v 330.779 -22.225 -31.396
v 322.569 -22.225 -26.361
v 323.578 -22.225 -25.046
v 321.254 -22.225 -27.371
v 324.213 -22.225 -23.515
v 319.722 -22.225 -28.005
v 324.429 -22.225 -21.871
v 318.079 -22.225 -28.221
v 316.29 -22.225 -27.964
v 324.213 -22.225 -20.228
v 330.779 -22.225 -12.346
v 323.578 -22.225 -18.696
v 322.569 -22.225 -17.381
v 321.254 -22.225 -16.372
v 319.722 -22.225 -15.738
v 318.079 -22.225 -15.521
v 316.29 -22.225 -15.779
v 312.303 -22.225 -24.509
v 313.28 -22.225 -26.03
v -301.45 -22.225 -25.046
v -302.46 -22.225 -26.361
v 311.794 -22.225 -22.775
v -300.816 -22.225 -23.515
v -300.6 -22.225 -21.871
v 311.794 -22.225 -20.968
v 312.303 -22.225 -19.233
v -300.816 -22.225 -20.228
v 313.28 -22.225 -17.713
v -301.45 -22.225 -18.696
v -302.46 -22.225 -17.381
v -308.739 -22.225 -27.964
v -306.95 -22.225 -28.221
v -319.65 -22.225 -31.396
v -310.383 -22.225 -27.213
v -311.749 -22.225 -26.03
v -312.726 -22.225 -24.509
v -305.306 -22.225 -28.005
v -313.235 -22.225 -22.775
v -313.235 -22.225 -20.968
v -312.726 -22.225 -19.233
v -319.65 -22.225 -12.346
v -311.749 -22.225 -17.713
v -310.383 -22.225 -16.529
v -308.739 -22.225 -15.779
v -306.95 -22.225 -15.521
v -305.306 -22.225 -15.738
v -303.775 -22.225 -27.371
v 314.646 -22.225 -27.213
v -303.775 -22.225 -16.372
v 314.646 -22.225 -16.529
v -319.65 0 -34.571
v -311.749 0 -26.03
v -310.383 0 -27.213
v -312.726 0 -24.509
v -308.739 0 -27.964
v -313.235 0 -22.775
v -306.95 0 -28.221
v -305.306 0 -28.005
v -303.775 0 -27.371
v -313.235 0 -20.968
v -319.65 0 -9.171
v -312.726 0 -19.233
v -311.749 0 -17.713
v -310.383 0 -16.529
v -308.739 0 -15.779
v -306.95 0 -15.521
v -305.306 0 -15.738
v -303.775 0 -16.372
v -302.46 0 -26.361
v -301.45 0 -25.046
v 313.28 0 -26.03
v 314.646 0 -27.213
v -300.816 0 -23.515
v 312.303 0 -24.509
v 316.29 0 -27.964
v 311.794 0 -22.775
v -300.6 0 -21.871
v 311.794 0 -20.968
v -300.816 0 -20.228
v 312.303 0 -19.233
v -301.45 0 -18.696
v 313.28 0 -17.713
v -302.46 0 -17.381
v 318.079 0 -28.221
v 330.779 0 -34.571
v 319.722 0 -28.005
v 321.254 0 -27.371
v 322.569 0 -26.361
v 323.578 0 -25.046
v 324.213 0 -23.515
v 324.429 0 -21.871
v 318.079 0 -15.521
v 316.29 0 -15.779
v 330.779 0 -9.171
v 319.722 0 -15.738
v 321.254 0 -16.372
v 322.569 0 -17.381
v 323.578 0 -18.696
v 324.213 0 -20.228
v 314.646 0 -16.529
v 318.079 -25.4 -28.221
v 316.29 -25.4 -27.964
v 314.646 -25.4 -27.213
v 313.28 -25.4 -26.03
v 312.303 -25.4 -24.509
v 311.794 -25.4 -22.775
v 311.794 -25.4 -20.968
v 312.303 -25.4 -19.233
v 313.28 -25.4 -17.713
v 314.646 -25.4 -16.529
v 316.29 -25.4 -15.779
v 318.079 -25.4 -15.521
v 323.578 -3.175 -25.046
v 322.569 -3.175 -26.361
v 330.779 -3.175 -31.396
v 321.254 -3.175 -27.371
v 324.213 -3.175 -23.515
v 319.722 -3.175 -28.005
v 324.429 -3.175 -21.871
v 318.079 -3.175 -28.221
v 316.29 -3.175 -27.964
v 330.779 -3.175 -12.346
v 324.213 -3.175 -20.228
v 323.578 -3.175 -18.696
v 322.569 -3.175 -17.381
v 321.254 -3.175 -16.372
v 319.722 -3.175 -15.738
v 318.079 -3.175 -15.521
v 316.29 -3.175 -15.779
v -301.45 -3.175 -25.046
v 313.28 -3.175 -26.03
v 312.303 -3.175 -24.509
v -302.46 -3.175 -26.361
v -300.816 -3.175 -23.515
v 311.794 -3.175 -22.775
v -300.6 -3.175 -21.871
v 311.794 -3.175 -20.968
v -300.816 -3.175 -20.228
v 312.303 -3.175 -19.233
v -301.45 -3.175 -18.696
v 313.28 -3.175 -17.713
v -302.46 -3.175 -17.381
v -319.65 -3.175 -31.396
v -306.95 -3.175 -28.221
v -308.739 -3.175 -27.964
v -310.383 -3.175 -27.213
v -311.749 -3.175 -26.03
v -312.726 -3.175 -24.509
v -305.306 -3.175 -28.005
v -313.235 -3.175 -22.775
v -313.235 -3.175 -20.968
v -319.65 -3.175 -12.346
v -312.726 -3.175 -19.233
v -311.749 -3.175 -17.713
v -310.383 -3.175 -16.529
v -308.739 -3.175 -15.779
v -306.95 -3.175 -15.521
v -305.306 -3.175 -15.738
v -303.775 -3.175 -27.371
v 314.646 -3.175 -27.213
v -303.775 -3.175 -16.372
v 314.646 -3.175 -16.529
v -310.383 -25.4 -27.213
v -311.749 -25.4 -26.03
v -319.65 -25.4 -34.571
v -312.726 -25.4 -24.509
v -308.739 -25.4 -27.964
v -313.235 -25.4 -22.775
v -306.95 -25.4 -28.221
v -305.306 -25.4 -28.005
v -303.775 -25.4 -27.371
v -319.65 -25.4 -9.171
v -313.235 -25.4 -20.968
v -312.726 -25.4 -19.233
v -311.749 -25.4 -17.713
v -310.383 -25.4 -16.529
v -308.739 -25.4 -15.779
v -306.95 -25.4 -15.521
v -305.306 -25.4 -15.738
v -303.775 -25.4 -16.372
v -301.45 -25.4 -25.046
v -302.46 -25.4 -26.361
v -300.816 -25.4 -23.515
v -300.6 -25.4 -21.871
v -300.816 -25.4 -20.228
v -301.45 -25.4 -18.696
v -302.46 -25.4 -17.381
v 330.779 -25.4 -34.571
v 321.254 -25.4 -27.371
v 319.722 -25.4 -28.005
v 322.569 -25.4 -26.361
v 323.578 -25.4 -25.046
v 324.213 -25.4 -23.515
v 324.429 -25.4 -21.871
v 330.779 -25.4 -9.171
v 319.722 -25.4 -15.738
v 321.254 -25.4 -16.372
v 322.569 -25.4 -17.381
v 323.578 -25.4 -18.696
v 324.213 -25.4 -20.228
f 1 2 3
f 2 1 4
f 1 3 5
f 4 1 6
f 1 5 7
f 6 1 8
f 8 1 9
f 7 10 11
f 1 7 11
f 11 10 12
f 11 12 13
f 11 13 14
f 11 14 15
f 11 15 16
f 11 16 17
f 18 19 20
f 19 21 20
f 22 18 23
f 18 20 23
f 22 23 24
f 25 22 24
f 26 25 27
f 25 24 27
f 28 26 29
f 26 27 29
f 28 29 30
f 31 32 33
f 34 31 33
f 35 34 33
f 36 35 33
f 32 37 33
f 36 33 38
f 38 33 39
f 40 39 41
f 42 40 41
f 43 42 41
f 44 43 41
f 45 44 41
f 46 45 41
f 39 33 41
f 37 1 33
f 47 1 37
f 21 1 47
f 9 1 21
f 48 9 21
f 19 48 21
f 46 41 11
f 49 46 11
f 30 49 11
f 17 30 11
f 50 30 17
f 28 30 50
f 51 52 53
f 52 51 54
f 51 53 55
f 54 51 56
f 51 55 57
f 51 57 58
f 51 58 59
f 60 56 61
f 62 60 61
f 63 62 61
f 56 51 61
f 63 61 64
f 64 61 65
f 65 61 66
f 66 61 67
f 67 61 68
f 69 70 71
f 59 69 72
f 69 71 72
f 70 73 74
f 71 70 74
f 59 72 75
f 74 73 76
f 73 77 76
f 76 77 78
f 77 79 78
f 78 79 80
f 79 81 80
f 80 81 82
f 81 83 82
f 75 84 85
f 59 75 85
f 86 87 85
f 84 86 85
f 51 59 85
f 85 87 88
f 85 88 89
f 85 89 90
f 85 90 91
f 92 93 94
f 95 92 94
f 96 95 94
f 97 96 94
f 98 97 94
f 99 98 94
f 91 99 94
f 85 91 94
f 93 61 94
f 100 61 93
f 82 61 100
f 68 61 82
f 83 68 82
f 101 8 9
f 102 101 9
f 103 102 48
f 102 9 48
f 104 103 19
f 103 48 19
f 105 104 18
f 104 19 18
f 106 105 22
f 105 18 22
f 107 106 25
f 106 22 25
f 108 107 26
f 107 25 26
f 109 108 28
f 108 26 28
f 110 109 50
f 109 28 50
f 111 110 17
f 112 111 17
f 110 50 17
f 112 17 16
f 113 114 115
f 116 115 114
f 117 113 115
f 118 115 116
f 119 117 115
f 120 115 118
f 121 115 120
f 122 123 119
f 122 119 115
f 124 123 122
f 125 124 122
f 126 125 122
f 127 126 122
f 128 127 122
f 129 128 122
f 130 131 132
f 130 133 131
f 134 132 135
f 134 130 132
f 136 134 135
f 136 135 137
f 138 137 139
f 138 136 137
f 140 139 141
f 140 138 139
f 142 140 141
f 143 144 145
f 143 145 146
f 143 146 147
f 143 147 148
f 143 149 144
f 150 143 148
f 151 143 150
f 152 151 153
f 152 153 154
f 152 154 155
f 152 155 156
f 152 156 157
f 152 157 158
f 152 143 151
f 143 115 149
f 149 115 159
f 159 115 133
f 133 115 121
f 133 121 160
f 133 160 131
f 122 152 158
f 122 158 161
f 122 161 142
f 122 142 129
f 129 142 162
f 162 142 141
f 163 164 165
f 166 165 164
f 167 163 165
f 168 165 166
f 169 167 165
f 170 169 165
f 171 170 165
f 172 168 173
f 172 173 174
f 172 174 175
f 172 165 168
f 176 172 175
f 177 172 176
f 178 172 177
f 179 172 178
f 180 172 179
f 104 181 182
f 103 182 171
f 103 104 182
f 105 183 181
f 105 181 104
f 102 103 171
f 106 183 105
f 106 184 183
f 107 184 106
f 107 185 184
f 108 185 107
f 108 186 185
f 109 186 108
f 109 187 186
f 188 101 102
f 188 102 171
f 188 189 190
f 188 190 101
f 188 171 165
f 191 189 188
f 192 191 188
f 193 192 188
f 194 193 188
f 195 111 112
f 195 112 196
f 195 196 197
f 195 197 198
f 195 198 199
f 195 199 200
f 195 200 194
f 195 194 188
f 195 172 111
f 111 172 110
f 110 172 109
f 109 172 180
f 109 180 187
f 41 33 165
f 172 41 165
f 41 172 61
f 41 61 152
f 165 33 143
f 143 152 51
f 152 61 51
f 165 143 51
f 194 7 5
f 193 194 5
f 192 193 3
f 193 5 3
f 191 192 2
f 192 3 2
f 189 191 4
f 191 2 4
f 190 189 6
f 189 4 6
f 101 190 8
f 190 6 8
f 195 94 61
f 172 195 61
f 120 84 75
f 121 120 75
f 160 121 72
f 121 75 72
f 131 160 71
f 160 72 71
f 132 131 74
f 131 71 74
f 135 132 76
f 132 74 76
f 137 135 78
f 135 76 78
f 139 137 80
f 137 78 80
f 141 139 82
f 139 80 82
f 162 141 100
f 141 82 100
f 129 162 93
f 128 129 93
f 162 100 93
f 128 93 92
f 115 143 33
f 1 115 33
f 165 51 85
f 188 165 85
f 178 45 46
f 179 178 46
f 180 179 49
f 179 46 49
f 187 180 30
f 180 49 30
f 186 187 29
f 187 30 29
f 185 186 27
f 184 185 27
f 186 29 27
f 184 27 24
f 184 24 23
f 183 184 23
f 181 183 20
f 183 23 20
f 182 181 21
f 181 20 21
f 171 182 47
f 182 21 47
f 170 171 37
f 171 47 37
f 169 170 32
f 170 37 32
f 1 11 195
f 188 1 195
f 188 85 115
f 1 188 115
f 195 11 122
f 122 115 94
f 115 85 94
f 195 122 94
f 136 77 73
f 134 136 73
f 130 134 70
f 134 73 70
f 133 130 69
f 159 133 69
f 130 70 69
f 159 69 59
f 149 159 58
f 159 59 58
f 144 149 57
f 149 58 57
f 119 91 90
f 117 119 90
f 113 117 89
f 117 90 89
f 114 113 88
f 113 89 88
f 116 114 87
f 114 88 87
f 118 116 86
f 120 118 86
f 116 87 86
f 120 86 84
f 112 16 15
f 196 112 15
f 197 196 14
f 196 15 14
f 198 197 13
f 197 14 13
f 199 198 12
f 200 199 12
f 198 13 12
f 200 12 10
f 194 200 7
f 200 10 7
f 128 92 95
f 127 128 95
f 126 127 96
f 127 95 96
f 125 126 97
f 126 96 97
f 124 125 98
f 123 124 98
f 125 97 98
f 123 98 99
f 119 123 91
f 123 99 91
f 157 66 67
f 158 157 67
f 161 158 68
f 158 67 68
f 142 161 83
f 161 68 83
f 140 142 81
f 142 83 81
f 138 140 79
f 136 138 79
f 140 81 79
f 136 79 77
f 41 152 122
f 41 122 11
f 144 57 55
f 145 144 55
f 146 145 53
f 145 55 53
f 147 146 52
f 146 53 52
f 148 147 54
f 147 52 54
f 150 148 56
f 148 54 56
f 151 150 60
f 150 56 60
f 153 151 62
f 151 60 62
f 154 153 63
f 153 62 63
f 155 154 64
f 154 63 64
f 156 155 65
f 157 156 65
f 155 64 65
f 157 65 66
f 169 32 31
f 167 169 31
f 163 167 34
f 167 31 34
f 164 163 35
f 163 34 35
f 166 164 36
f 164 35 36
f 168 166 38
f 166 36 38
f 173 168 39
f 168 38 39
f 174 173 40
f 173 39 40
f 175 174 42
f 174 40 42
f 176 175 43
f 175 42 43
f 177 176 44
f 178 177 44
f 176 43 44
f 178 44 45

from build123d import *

# Parameters (mm, degrees)
F1_DEPTH = 25.4
F2_W     = 19.05
F2_H     = 19.05
F3_DEPTH = 650.4296966


with BuildPart() as f1:
    # F0 (on Front) → F1 (new body)
    with BuildSketch(Plane.XZ):
        with BuildLine():
            Line((318.0789541172, -9.1712903899), (-306.9497424828, -9.1712903899))
            Line((-306.9497424828, -9.1712903899), (-306.9497424828, -15.5212903899))
            ThreePointArc((-306.9497424828, -15.5212903899), (-302.4596144223, -17.3811623294), (-300.5997424828, -21.8712903899))
            ThreePointArc((-300.5997424828, -21.8712903899), (-302.4596144223, -26.3614184504), (-306.9497424828, -28.2212903899))
            Line((-306.9497424828, -28.2212903899), (-306.9497424828, -34.5712903899))
            Line((-306.9497424828, -34.5712903899), (318.0789541172, -34.5712903899))
            Line((318.0789541172, -34.5712903899), (318.0789541172, -28.2212903899))
            ThreePointArc((318.0789541172, -28.2212903899), (311.7289541172, -21.8712903899), (318.0789541172, -15.5212903899))
            Line((318.0789541172, -15.5212903899), (318.0789541172, -9.1712903899))
        make_face()
        with BuildLine():
            Line((-306.9497424828, -15.5212903899), (-306.9497424828, -9.1712903899))
            ThreePointArc((-306.9497424828, -9.1712903899), (-315.9299986039, -12.8910342688), (-319.6497424828, -21.8712903899))
            ThreePointArc((-319.6497424828, -21.8712903899), (-315.9299986039, -30.851546511), (-306.9497424828, -34.5712903899))
            Line((-306.9497424828, -34.5712903899), (-306.9497424828, -28.2212903899))
            ThreePointArc((-306.9497424828, -28.2212903899), (-313.2997424828, -21.8712903899), (-306.9497424828, -15.5212903899))
        make_face()
        with BuildLine():
            Line((330.7789541172, -9.1712903899), (318.0789541172, -9.1712903899))
            ThreePointArc((318.0789541172, -9.1712903899), (327.0592102383, -12.8910342688), (330.7789541172, -21.8712903899))
            Line((330.7789541172, -21.8712903899), (330.7789541172, -9.1712903899))
        make_face()
        with BuildLine():
            Line((330.7789541172, -34.5712903899), (330.7789541172, -21.8712903899))
            ThreePointArc((330.7789541172, -21.8712903899), (327.0592102383, -30.851546511), (318.0789541172, -34.5712903899))
            Line((318.0789541172, -34.5712903899), (330.7789541172, -34.5712903899))
        make_face()
        with BuildLine():
            ThreePointArc((330.7789541172, -21.8712903899), (327.0592102383, -12.8910342688), (318.0789541172, -9.1712903899))
            Line((318.0789541172, -9.1712903899), (318.0789541172, -15.5212903899))
            ThreePointArc((318.0789541172, -15.5212903899), (322.5690821777, -17.3811623294), (324.4289541172, -21.8712903899))
            ThreePointArc((324.4289541172, -21.8712903899), (322.5690821777, -26.3614184504), (318.0789541172, -28.2212903899))
            Line((318.0789541172, -28.2212903899), (318.0789541172, -34.5712903899))
            ThreePointArc((318.0789541172, -34.5712903899), (327.0592102383, -30.851546511), (330.7789541172, -21.8712903899))
        make_face()
        with BuildLine():
            ThreePointArc((-319.6497424828, -21.8712903899), (-315.9299986039, -12.8910342688), (-306.9497424828, -9.1712903899))
            Line((-306.9497424828, -9.1712903899), (-319.6497424828, -9.1712903899))
            Line((-319.6497424828, -9.1712903899), (-319.6497424828, -21.8712903899))
        make_face()
        with BuildLine():
            ThreePointArc((-306.9497424828, -34.5712903899), (-315.9299986039, -30.851546511), (-319.6497424828, -21.8712903899))
            Line((-319.6497424828, -21.8712903899), (-319.6497424828, -34.5712903899))
            Line((-319.6497424828, -34.5712903899), (-306.9497424828, -34.5712903899))
        make_face()
    extrude(amount=F1_DEPTH)

    # F2 (on face) → F3 (cut, through all)
    with BuildSketch(Plane(origin=(-319.6497424828, 0, 0), x_dir=(0, -1, 0), z_dir=(-1, 0, 0))):
        with Locations((12.7, -21.8712903899)):
            Rectangle(F2_W, F2_H)
    extrude(amount=-F3_DEPTH, mode=Mode.SUBTRACT)


solid = f1.part
